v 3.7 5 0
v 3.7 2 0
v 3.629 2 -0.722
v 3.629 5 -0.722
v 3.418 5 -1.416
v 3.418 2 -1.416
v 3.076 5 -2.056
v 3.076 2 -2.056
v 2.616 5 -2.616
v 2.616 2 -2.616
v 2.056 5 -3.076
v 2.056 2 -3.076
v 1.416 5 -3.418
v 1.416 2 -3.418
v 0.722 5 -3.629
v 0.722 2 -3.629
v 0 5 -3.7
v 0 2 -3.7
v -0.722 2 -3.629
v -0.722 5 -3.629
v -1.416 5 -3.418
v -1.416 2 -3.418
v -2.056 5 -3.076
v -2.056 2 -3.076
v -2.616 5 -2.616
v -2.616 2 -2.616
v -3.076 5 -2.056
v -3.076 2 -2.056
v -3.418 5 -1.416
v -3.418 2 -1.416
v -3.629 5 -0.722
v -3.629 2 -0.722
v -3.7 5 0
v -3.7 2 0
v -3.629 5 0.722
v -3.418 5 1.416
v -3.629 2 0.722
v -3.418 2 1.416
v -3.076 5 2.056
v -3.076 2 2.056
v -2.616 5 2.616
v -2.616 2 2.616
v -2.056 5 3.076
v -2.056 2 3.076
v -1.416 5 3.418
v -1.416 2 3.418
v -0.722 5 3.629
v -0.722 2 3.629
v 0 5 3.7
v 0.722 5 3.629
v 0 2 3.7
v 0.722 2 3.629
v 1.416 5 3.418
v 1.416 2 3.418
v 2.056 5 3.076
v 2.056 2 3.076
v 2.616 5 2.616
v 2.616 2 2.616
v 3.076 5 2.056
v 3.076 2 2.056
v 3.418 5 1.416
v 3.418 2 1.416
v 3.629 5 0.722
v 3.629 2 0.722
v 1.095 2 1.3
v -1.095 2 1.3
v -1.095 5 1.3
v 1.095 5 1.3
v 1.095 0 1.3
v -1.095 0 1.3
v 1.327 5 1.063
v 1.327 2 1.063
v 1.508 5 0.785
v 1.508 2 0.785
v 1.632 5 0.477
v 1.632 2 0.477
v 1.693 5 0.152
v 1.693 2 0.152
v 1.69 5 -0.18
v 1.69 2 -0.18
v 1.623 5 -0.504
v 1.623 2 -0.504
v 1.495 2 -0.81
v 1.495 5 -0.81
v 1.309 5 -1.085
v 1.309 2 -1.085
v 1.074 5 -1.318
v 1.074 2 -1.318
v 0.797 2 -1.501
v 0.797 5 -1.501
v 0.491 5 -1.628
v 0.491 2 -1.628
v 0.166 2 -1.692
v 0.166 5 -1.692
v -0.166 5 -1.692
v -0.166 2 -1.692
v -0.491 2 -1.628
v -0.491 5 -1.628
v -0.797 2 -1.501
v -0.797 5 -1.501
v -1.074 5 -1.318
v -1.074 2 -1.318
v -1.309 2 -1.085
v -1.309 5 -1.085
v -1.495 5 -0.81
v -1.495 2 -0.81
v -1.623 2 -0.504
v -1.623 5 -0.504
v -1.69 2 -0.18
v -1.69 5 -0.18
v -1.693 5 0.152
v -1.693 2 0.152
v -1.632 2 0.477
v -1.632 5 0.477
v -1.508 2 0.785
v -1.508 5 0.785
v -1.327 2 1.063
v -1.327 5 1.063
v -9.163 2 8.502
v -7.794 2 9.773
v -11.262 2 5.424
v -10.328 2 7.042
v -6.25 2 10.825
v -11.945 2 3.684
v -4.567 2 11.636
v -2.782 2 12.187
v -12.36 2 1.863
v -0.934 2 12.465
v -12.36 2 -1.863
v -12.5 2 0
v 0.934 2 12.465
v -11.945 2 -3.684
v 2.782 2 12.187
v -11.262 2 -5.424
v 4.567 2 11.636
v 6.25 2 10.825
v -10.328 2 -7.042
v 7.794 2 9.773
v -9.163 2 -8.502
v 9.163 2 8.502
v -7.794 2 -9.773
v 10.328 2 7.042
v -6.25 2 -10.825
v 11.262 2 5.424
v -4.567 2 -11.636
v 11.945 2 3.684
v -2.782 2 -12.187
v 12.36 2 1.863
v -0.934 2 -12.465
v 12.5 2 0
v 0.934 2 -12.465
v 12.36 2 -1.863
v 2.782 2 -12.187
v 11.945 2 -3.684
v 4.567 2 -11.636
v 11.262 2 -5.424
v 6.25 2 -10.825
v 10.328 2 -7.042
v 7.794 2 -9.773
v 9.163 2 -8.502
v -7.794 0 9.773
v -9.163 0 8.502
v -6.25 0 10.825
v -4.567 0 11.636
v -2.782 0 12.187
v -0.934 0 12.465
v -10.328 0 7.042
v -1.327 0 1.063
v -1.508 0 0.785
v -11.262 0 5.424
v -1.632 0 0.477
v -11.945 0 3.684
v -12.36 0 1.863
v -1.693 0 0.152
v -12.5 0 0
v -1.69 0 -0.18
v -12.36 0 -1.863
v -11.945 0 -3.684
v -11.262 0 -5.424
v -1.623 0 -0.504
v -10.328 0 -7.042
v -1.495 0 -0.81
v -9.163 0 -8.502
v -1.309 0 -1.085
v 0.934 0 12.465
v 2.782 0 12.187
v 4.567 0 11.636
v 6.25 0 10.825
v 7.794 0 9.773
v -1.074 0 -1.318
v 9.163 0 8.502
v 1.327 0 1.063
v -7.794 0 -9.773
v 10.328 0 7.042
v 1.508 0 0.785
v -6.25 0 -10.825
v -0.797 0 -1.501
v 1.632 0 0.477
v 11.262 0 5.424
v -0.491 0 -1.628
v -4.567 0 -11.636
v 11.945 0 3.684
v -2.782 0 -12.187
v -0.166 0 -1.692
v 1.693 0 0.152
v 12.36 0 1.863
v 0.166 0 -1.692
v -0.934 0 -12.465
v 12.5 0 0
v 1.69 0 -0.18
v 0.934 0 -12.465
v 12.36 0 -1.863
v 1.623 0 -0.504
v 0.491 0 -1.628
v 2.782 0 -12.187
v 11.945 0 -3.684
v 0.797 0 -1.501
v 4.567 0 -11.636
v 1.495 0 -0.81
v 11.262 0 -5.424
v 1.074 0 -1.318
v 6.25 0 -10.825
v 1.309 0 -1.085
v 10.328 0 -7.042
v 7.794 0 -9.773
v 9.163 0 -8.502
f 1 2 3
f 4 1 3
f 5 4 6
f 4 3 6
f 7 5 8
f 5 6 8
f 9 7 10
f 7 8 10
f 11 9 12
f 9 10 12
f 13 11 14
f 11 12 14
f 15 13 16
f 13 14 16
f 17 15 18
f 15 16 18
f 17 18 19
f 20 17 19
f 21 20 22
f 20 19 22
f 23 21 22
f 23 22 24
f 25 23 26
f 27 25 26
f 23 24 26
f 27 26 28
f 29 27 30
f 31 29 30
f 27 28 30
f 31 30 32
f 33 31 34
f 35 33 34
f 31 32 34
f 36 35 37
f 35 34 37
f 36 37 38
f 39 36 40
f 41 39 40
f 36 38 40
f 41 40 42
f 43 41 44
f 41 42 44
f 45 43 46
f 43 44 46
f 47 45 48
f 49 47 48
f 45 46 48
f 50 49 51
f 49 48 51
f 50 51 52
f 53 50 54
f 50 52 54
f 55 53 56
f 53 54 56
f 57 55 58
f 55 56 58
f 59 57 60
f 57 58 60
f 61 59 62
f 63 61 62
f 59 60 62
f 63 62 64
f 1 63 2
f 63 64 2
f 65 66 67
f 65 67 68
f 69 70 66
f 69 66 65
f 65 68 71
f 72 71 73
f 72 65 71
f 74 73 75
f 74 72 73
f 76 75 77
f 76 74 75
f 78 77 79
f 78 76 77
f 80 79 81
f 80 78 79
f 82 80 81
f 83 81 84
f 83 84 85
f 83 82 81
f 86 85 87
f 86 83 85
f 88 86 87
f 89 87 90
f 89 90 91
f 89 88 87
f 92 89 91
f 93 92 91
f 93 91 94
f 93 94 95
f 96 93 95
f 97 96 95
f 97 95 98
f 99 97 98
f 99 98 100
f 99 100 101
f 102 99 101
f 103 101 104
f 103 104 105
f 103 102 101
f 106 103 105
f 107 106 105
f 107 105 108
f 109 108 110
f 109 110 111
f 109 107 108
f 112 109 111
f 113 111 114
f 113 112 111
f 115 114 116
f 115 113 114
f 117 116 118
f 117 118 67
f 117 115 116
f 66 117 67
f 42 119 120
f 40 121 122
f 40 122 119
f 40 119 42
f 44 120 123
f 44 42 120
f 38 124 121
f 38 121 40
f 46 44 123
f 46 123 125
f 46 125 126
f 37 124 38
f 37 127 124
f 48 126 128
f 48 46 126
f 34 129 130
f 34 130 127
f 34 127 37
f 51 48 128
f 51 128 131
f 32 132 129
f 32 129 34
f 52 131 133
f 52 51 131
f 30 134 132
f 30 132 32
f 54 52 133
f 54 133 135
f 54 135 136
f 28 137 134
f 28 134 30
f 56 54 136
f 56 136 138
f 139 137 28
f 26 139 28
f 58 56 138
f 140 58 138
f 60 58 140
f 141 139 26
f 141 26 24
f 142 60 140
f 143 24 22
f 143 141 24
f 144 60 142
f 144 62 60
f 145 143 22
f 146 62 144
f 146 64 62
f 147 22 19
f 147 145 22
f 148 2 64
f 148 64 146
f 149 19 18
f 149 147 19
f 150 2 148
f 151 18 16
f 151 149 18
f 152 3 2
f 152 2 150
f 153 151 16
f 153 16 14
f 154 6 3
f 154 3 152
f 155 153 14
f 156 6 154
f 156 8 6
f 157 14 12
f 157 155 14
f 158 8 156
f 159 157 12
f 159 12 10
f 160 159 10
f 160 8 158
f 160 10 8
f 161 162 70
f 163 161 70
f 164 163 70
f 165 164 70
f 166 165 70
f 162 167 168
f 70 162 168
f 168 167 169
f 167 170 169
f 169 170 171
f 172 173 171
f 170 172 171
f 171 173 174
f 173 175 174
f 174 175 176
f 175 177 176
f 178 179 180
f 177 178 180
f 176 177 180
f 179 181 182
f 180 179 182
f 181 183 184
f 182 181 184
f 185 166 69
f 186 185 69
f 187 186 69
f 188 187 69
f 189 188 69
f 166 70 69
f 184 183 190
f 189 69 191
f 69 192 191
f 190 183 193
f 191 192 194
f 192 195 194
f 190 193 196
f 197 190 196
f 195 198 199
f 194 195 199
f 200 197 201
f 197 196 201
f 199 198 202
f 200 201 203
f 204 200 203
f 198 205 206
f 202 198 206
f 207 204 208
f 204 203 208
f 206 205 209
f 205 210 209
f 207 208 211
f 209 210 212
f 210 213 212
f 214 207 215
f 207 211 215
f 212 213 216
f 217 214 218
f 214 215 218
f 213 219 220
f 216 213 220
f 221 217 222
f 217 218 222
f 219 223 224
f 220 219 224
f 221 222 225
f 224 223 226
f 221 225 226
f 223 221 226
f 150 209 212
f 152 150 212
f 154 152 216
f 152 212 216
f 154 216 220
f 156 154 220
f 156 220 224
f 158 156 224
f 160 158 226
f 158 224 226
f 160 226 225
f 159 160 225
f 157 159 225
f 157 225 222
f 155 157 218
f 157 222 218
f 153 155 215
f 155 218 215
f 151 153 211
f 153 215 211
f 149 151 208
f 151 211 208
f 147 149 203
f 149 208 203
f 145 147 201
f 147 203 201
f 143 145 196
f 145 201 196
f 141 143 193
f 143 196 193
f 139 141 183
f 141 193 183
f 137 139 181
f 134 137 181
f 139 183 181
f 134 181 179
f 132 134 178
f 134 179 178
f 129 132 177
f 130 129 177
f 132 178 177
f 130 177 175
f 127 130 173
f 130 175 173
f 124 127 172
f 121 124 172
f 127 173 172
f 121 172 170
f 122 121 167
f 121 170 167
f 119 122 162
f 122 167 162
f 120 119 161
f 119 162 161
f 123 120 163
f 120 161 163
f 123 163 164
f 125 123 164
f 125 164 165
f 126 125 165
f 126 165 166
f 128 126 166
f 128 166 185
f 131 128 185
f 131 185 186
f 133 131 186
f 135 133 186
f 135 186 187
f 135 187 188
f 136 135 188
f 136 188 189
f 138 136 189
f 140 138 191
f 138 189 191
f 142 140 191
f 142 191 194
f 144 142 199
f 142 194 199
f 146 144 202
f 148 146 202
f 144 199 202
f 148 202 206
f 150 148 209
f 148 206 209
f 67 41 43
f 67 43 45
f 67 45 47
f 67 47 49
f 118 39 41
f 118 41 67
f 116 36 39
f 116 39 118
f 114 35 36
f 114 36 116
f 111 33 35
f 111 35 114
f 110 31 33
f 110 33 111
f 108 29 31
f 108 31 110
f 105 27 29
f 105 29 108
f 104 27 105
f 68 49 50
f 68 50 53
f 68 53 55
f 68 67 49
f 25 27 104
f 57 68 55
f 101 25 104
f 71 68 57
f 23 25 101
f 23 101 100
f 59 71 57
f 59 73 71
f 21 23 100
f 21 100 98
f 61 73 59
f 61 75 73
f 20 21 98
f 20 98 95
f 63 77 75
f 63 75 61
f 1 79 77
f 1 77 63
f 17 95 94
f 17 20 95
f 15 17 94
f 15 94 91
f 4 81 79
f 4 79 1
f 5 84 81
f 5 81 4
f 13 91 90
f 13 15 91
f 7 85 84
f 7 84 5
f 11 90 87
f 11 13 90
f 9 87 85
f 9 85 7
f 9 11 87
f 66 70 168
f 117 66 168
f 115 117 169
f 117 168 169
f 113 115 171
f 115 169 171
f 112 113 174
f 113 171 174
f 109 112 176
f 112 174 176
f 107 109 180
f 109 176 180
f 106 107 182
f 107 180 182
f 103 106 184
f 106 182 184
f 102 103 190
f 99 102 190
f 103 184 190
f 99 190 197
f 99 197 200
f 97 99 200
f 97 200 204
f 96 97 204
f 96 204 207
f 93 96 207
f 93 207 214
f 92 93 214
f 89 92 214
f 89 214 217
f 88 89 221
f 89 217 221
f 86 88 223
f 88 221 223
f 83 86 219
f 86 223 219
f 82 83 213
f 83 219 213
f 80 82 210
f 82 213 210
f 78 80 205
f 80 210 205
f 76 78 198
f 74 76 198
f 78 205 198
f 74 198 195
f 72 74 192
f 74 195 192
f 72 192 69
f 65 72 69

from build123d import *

# Parameters (mm, degrees)
SKETCH1_R           = 12.5
BOSS_EXTRUDE1_DEPTH = 2
SKETCH2_R           = 3.7
BOSS_EXTRUDE2_DEPTH = 3


with BuildPart() as part:
    # Sketch1 → Boss-Extrude1 (new body)
    with BuildSketch(Plane(origin=(0, 0, 0), x_dir=(1, 0, 0), z_dir=(0, 1, 0))):
        Circle(SKETCH1_R)
        with BuildLine():
            Line((1.095445115, -1.3), (-1.095445115, -1.3))
            ThreePointArc((-1.095445115, -1.3), (0, 1.7), (1.095445115, -1.3))
        make_face(mode=Mode.SUBTRACT)
    extrude(amount=BOSS_EXTRUDE1_DEPTH)

    # Sketch2 → Boss-Extrude2 (add)
    with BuildSketch(Plane(origin=(0, 2, 0), x_dir=(1, 0, 0), z_dir=(0, 1, 0))):
        Circle(SKETCH2_R)
        with BuildLine():
            Line((-1.095445115, -1.3), (1.095445115, -1.3))
            ThreePointArc((1.095445115, -1.3), (0, 1.7), (-1.095445115, -1.3))
        make_face(mode=Mode.SUBTRACT)
    extrude(amount=BOSS_EXTRUDE2_DEPTH)


solid = part.part
